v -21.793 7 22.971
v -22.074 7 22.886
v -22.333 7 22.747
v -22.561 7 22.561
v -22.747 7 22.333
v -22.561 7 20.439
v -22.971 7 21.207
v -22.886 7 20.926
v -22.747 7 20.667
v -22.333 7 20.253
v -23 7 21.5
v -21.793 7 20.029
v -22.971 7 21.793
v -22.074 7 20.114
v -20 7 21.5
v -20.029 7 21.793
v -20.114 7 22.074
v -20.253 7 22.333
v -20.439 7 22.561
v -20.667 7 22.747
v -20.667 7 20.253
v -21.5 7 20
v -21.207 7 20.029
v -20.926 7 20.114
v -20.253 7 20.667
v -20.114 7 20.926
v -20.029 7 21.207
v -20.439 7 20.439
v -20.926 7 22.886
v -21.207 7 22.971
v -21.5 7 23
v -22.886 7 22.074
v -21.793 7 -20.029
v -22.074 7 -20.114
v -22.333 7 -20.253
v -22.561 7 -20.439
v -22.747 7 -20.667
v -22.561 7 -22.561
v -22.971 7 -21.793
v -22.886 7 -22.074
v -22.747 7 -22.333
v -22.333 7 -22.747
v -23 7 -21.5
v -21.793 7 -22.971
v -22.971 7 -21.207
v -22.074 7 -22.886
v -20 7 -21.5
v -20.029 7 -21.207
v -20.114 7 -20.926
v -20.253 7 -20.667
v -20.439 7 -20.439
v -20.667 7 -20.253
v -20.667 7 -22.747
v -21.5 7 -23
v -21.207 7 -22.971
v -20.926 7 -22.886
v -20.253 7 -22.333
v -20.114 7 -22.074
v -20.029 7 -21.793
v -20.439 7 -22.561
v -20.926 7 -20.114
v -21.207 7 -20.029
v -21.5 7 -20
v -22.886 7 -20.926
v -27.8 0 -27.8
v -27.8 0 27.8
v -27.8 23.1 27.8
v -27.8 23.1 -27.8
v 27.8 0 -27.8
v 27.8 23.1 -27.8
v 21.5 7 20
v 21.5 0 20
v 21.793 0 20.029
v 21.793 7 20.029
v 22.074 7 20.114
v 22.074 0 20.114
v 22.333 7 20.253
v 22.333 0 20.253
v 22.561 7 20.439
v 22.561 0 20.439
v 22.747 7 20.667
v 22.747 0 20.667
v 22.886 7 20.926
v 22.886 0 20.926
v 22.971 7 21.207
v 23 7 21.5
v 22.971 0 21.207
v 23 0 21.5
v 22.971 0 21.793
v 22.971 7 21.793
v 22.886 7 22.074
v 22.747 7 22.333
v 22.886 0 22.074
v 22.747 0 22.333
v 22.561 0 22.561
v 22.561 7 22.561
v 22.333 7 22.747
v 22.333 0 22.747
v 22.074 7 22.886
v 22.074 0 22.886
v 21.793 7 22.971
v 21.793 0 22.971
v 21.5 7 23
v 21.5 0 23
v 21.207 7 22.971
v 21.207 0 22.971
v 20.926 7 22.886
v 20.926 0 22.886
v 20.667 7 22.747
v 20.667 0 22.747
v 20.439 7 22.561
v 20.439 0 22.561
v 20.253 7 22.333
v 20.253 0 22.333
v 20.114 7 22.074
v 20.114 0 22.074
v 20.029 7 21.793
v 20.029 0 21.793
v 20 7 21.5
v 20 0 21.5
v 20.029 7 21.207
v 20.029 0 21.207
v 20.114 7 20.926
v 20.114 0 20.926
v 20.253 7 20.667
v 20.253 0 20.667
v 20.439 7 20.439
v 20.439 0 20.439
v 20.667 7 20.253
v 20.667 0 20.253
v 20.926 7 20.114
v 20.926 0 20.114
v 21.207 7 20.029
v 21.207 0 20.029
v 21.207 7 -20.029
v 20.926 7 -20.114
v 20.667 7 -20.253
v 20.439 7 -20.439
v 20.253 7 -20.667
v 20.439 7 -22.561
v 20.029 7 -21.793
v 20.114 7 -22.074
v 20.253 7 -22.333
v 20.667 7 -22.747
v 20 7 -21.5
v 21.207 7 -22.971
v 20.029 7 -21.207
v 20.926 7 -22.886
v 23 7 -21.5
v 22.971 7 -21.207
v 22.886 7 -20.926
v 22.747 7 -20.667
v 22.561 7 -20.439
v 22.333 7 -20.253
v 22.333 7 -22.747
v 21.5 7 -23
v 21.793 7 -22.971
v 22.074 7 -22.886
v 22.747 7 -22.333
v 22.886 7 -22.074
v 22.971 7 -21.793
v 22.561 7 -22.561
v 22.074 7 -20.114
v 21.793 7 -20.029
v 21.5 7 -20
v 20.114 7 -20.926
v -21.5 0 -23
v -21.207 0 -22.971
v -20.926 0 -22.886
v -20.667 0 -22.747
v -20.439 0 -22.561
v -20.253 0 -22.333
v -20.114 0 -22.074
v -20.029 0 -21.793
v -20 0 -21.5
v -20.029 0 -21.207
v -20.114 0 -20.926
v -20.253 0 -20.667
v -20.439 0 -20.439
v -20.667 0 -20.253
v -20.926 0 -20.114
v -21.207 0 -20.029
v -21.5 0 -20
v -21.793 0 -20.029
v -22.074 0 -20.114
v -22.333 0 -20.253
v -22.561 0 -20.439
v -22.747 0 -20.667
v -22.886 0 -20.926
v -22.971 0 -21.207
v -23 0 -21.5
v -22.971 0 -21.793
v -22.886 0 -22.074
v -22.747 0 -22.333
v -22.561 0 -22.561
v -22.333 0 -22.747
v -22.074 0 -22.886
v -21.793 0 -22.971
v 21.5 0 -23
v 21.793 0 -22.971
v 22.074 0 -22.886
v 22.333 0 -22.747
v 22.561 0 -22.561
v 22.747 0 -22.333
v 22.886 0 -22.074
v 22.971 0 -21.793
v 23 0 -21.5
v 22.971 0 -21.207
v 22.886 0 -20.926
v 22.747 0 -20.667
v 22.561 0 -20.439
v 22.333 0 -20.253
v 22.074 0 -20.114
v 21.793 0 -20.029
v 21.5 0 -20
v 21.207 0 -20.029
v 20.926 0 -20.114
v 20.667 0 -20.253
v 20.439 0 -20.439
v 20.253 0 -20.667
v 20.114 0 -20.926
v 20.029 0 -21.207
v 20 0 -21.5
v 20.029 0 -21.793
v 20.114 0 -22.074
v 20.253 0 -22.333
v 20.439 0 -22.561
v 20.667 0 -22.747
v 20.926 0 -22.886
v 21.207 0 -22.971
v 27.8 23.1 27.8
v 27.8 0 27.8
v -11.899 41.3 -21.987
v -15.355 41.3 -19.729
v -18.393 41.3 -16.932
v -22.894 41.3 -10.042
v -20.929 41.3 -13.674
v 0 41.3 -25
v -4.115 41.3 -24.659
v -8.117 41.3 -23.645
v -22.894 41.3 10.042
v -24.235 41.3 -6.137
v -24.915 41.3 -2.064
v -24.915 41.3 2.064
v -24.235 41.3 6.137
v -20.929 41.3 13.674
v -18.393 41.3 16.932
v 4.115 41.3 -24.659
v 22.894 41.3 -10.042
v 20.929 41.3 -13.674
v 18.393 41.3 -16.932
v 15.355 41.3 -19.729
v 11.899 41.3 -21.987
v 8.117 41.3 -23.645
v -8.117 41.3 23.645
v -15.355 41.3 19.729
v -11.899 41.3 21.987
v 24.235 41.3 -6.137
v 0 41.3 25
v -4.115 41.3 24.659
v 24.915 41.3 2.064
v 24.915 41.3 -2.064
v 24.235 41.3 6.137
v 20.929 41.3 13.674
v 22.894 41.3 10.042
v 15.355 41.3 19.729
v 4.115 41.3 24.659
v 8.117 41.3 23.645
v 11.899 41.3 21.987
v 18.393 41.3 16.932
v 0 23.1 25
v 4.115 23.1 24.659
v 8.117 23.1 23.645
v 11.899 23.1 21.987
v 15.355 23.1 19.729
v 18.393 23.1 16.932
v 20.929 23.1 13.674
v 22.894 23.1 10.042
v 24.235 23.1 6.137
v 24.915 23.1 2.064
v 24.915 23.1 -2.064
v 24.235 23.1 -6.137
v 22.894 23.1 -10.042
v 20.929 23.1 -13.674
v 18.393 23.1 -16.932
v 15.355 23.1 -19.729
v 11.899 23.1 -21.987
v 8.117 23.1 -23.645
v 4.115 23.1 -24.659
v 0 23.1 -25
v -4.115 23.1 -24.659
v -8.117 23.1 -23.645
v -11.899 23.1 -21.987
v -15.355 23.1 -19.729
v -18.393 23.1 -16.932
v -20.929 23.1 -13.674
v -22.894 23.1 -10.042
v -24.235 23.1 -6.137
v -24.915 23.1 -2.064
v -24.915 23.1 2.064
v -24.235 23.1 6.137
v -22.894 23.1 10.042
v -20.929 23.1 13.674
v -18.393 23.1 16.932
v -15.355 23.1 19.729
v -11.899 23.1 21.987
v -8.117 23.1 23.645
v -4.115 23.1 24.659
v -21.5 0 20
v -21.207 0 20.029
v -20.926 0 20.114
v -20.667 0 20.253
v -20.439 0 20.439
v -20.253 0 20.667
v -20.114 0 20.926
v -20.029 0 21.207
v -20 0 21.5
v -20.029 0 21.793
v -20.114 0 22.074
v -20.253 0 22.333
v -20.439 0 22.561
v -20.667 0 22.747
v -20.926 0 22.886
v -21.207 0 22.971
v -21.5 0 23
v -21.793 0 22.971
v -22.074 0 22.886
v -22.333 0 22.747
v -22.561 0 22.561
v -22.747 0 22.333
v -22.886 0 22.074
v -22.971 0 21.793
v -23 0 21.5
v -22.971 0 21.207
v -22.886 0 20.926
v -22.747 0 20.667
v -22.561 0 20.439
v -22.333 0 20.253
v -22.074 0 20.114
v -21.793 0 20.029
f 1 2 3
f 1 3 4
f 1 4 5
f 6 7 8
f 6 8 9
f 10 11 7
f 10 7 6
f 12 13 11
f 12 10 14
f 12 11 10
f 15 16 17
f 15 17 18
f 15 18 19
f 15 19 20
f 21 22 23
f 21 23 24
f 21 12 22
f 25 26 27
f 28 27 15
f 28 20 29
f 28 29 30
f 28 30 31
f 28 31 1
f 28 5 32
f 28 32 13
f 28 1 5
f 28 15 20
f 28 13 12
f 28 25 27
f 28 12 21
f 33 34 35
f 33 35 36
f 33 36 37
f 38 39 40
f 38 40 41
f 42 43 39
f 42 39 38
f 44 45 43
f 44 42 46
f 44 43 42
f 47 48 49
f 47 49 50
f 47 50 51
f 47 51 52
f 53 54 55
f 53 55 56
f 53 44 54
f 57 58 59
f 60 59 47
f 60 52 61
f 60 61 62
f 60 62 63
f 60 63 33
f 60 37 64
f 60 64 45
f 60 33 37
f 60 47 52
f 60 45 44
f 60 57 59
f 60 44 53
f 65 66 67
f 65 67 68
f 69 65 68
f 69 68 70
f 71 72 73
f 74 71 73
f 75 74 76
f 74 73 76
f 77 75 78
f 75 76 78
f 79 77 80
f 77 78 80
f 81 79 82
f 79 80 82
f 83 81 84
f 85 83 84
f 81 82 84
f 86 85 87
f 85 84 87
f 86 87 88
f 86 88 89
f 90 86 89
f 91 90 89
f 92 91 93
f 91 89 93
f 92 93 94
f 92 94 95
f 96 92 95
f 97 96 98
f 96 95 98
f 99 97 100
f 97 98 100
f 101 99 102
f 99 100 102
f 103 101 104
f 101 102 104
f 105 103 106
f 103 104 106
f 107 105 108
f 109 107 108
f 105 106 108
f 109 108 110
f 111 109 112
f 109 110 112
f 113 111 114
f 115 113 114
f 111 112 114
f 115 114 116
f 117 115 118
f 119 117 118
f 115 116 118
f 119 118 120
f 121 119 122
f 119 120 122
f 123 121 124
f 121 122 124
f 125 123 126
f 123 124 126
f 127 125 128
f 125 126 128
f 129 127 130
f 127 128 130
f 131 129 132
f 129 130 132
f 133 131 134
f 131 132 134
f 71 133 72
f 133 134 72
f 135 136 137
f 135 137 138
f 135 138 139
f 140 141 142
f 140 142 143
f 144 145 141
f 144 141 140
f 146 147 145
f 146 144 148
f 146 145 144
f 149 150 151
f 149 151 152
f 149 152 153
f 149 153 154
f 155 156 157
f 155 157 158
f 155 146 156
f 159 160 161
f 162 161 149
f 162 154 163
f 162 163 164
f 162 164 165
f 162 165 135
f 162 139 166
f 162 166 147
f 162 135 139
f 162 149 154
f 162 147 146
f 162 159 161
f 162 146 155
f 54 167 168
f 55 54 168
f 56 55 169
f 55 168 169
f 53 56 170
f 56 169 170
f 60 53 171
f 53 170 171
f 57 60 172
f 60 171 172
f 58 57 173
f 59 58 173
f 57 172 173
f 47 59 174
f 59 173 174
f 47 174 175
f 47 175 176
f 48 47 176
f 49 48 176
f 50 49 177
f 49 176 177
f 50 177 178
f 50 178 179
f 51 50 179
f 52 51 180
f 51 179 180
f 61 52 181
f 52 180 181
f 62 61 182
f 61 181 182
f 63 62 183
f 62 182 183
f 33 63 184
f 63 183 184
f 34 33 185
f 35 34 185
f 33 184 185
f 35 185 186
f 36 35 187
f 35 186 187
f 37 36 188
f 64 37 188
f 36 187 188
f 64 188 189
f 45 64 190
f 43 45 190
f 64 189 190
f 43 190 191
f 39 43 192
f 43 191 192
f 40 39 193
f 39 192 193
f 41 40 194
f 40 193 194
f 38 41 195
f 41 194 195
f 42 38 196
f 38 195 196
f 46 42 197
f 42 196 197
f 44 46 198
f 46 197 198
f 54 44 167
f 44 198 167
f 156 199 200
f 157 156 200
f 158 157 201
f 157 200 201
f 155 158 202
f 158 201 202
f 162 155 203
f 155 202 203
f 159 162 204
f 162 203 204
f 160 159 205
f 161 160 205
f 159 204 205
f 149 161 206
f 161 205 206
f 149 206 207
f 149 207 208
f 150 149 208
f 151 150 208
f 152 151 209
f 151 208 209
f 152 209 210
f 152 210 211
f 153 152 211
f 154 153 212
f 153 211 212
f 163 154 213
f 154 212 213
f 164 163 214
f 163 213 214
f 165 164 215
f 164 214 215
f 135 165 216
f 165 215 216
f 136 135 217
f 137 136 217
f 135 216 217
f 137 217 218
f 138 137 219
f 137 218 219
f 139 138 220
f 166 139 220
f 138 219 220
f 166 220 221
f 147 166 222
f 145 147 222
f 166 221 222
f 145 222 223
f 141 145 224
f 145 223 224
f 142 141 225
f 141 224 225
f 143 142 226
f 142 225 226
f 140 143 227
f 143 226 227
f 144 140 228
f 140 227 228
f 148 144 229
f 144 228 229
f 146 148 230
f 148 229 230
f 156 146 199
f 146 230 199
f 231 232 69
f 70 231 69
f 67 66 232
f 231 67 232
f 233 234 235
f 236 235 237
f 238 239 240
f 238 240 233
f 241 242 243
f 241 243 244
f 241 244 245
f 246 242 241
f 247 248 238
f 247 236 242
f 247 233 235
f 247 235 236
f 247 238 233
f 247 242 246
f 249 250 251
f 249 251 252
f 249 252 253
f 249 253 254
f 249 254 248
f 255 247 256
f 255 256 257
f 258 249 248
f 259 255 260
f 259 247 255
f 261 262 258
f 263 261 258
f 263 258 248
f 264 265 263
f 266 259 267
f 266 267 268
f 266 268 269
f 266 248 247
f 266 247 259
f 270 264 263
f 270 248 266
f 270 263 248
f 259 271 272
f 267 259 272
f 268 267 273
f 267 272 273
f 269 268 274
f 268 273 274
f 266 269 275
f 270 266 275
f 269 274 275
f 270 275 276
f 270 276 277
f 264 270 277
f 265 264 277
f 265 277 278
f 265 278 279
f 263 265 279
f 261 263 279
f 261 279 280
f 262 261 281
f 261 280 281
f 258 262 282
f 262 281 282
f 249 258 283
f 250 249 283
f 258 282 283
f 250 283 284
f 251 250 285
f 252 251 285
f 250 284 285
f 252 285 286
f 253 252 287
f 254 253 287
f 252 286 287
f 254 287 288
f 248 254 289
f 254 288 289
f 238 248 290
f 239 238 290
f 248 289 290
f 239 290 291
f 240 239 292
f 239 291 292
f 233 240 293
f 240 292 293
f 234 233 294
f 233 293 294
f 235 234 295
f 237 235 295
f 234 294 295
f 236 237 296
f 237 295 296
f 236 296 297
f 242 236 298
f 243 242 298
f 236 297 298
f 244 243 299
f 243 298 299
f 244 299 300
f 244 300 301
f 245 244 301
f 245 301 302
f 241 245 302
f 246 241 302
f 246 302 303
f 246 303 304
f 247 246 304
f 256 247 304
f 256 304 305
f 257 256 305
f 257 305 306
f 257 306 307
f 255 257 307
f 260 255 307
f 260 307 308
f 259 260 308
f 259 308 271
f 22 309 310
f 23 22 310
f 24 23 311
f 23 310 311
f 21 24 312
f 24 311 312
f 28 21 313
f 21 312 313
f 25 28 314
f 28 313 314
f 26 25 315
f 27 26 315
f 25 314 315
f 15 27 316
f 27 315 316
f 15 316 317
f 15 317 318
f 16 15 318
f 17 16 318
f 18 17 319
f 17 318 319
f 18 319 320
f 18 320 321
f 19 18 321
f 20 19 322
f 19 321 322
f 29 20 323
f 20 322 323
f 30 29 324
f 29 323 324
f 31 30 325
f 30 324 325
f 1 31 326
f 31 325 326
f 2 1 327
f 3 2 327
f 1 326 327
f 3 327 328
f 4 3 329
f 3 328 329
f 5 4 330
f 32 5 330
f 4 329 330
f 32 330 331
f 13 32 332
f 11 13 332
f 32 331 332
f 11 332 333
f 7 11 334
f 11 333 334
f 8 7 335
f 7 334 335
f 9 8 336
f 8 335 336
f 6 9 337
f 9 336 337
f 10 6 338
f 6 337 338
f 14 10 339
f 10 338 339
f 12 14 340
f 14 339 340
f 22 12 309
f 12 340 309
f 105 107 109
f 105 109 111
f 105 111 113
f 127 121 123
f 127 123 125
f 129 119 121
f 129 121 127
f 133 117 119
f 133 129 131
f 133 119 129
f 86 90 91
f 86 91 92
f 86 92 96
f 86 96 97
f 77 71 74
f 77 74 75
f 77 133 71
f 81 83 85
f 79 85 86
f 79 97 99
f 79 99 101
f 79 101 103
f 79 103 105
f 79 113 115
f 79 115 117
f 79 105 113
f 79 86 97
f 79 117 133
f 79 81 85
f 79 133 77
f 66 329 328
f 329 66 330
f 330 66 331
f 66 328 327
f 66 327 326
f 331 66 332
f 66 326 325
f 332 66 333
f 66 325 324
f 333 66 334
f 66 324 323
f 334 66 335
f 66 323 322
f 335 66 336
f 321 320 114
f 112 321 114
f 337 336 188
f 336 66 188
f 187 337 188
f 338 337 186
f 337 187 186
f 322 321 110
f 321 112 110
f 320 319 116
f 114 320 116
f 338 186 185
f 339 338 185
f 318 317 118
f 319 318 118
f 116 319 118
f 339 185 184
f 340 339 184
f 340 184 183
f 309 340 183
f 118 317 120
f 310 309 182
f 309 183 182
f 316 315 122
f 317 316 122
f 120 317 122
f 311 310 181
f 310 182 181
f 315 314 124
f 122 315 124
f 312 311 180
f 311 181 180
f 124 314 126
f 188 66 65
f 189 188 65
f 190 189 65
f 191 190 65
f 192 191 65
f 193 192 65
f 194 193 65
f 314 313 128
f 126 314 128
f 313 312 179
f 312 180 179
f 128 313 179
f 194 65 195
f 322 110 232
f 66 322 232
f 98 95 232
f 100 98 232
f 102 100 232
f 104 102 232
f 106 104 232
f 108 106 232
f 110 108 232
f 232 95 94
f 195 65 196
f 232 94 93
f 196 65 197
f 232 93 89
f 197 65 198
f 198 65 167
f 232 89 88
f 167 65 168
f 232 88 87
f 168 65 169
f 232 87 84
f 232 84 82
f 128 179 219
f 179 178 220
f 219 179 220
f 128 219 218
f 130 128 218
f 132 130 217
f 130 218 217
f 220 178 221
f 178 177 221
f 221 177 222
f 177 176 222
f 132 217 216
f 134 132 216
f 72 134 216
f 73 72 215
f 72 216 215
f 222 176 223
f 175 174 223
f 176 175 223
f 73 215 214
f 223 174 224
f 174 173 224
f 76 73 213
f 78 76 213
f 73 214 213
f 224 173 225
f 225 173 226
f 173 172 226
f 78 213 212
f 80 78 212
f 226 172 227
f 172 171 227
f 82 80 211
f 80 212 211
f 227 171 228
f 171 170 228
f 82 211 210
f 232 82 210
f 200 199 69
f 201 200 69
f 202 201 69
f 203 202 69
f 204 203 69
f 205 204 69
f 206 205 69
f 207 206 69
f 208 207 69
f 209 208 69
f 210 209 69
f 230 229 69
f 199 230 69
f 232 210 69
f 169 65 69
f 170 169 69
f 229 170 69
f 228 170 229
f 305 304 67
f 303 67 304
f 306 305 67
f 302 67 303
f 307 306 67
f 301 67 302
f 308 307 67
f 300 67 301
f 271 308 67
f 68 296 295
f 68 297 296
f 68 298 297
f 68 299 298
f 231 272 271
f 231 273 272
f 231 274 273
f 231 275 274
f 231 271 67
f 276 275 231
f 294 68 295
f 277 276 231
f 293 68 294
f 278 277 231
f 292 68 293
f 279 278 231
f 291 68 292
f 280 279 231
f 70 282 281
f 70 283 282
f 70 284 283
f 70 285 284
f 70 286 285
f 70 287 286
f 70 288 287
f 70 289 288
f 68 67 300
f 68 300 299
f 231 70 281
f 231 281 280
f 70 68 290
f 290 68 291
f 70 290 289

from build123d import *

# Parameters (mm, degrees)
SKETCH1_W           = 55.6
SKETCH1_H           = 55.6
BOSS_EXTRUDE1_DEPTH = 23.1
SKETCH2_R           = 25
BOSS_EXTRUDE2_DEPTH = 18.2
SKETCH3_R           = 1.5
CUT_EXTRUDE1_DEPTH  = 7


with BuildPart() as part:
    # Sketch1 → Boss-Extrude1 (new body)
    with BuildSketch(Plane(origin=(0, 0, 0), x_dir=(1, 0, 0), z_dir=(0, 1, 0))):
        Rectangle(SKETCH1_W, SKETCH1_H)
    extrude(amount=BOSS_EXTRUDE1_DEPTH)

    # Sketch2 → Boss-Extrude2 (add)
    with BuildSketch(Plane(origin=(0, 23.1, 0), x_dir=(1, 0, 0), z_dir=(0, 1, 0))):
        with Locations(Location((0, 0, 0), (0, 0, 270))):
            Circle(SKETCH2_R)
    extrude(amount=BOSS_EXTRUDE2_DEPTH)

    # Sketch3 → Cut-Extrude1 (cut)
    with BuildSketch(Plane.XZ):
        with Locations(Location((-21.5, 21.5, 0), (0, 0, 270))):
            Circle(SKETCH3_R)
        with Locations(Location((21.5, 21.5, 0), (0, 0, 270))):
            Circle(SKETCH3_R)
        with Locations(Location((-21.5, -21.5, 0), (0, 0, 270))):
            Circle(SKETCH3_R)
        with Locations(Location((21.5, -21.5, 0), (0, 0, 270))):
            Circle(SKETCH3_R)
    extrude(amount=-CUT_EXTRUDE1_DEPTH, mode=Mode.SUBTRACT)


solid = part.part
